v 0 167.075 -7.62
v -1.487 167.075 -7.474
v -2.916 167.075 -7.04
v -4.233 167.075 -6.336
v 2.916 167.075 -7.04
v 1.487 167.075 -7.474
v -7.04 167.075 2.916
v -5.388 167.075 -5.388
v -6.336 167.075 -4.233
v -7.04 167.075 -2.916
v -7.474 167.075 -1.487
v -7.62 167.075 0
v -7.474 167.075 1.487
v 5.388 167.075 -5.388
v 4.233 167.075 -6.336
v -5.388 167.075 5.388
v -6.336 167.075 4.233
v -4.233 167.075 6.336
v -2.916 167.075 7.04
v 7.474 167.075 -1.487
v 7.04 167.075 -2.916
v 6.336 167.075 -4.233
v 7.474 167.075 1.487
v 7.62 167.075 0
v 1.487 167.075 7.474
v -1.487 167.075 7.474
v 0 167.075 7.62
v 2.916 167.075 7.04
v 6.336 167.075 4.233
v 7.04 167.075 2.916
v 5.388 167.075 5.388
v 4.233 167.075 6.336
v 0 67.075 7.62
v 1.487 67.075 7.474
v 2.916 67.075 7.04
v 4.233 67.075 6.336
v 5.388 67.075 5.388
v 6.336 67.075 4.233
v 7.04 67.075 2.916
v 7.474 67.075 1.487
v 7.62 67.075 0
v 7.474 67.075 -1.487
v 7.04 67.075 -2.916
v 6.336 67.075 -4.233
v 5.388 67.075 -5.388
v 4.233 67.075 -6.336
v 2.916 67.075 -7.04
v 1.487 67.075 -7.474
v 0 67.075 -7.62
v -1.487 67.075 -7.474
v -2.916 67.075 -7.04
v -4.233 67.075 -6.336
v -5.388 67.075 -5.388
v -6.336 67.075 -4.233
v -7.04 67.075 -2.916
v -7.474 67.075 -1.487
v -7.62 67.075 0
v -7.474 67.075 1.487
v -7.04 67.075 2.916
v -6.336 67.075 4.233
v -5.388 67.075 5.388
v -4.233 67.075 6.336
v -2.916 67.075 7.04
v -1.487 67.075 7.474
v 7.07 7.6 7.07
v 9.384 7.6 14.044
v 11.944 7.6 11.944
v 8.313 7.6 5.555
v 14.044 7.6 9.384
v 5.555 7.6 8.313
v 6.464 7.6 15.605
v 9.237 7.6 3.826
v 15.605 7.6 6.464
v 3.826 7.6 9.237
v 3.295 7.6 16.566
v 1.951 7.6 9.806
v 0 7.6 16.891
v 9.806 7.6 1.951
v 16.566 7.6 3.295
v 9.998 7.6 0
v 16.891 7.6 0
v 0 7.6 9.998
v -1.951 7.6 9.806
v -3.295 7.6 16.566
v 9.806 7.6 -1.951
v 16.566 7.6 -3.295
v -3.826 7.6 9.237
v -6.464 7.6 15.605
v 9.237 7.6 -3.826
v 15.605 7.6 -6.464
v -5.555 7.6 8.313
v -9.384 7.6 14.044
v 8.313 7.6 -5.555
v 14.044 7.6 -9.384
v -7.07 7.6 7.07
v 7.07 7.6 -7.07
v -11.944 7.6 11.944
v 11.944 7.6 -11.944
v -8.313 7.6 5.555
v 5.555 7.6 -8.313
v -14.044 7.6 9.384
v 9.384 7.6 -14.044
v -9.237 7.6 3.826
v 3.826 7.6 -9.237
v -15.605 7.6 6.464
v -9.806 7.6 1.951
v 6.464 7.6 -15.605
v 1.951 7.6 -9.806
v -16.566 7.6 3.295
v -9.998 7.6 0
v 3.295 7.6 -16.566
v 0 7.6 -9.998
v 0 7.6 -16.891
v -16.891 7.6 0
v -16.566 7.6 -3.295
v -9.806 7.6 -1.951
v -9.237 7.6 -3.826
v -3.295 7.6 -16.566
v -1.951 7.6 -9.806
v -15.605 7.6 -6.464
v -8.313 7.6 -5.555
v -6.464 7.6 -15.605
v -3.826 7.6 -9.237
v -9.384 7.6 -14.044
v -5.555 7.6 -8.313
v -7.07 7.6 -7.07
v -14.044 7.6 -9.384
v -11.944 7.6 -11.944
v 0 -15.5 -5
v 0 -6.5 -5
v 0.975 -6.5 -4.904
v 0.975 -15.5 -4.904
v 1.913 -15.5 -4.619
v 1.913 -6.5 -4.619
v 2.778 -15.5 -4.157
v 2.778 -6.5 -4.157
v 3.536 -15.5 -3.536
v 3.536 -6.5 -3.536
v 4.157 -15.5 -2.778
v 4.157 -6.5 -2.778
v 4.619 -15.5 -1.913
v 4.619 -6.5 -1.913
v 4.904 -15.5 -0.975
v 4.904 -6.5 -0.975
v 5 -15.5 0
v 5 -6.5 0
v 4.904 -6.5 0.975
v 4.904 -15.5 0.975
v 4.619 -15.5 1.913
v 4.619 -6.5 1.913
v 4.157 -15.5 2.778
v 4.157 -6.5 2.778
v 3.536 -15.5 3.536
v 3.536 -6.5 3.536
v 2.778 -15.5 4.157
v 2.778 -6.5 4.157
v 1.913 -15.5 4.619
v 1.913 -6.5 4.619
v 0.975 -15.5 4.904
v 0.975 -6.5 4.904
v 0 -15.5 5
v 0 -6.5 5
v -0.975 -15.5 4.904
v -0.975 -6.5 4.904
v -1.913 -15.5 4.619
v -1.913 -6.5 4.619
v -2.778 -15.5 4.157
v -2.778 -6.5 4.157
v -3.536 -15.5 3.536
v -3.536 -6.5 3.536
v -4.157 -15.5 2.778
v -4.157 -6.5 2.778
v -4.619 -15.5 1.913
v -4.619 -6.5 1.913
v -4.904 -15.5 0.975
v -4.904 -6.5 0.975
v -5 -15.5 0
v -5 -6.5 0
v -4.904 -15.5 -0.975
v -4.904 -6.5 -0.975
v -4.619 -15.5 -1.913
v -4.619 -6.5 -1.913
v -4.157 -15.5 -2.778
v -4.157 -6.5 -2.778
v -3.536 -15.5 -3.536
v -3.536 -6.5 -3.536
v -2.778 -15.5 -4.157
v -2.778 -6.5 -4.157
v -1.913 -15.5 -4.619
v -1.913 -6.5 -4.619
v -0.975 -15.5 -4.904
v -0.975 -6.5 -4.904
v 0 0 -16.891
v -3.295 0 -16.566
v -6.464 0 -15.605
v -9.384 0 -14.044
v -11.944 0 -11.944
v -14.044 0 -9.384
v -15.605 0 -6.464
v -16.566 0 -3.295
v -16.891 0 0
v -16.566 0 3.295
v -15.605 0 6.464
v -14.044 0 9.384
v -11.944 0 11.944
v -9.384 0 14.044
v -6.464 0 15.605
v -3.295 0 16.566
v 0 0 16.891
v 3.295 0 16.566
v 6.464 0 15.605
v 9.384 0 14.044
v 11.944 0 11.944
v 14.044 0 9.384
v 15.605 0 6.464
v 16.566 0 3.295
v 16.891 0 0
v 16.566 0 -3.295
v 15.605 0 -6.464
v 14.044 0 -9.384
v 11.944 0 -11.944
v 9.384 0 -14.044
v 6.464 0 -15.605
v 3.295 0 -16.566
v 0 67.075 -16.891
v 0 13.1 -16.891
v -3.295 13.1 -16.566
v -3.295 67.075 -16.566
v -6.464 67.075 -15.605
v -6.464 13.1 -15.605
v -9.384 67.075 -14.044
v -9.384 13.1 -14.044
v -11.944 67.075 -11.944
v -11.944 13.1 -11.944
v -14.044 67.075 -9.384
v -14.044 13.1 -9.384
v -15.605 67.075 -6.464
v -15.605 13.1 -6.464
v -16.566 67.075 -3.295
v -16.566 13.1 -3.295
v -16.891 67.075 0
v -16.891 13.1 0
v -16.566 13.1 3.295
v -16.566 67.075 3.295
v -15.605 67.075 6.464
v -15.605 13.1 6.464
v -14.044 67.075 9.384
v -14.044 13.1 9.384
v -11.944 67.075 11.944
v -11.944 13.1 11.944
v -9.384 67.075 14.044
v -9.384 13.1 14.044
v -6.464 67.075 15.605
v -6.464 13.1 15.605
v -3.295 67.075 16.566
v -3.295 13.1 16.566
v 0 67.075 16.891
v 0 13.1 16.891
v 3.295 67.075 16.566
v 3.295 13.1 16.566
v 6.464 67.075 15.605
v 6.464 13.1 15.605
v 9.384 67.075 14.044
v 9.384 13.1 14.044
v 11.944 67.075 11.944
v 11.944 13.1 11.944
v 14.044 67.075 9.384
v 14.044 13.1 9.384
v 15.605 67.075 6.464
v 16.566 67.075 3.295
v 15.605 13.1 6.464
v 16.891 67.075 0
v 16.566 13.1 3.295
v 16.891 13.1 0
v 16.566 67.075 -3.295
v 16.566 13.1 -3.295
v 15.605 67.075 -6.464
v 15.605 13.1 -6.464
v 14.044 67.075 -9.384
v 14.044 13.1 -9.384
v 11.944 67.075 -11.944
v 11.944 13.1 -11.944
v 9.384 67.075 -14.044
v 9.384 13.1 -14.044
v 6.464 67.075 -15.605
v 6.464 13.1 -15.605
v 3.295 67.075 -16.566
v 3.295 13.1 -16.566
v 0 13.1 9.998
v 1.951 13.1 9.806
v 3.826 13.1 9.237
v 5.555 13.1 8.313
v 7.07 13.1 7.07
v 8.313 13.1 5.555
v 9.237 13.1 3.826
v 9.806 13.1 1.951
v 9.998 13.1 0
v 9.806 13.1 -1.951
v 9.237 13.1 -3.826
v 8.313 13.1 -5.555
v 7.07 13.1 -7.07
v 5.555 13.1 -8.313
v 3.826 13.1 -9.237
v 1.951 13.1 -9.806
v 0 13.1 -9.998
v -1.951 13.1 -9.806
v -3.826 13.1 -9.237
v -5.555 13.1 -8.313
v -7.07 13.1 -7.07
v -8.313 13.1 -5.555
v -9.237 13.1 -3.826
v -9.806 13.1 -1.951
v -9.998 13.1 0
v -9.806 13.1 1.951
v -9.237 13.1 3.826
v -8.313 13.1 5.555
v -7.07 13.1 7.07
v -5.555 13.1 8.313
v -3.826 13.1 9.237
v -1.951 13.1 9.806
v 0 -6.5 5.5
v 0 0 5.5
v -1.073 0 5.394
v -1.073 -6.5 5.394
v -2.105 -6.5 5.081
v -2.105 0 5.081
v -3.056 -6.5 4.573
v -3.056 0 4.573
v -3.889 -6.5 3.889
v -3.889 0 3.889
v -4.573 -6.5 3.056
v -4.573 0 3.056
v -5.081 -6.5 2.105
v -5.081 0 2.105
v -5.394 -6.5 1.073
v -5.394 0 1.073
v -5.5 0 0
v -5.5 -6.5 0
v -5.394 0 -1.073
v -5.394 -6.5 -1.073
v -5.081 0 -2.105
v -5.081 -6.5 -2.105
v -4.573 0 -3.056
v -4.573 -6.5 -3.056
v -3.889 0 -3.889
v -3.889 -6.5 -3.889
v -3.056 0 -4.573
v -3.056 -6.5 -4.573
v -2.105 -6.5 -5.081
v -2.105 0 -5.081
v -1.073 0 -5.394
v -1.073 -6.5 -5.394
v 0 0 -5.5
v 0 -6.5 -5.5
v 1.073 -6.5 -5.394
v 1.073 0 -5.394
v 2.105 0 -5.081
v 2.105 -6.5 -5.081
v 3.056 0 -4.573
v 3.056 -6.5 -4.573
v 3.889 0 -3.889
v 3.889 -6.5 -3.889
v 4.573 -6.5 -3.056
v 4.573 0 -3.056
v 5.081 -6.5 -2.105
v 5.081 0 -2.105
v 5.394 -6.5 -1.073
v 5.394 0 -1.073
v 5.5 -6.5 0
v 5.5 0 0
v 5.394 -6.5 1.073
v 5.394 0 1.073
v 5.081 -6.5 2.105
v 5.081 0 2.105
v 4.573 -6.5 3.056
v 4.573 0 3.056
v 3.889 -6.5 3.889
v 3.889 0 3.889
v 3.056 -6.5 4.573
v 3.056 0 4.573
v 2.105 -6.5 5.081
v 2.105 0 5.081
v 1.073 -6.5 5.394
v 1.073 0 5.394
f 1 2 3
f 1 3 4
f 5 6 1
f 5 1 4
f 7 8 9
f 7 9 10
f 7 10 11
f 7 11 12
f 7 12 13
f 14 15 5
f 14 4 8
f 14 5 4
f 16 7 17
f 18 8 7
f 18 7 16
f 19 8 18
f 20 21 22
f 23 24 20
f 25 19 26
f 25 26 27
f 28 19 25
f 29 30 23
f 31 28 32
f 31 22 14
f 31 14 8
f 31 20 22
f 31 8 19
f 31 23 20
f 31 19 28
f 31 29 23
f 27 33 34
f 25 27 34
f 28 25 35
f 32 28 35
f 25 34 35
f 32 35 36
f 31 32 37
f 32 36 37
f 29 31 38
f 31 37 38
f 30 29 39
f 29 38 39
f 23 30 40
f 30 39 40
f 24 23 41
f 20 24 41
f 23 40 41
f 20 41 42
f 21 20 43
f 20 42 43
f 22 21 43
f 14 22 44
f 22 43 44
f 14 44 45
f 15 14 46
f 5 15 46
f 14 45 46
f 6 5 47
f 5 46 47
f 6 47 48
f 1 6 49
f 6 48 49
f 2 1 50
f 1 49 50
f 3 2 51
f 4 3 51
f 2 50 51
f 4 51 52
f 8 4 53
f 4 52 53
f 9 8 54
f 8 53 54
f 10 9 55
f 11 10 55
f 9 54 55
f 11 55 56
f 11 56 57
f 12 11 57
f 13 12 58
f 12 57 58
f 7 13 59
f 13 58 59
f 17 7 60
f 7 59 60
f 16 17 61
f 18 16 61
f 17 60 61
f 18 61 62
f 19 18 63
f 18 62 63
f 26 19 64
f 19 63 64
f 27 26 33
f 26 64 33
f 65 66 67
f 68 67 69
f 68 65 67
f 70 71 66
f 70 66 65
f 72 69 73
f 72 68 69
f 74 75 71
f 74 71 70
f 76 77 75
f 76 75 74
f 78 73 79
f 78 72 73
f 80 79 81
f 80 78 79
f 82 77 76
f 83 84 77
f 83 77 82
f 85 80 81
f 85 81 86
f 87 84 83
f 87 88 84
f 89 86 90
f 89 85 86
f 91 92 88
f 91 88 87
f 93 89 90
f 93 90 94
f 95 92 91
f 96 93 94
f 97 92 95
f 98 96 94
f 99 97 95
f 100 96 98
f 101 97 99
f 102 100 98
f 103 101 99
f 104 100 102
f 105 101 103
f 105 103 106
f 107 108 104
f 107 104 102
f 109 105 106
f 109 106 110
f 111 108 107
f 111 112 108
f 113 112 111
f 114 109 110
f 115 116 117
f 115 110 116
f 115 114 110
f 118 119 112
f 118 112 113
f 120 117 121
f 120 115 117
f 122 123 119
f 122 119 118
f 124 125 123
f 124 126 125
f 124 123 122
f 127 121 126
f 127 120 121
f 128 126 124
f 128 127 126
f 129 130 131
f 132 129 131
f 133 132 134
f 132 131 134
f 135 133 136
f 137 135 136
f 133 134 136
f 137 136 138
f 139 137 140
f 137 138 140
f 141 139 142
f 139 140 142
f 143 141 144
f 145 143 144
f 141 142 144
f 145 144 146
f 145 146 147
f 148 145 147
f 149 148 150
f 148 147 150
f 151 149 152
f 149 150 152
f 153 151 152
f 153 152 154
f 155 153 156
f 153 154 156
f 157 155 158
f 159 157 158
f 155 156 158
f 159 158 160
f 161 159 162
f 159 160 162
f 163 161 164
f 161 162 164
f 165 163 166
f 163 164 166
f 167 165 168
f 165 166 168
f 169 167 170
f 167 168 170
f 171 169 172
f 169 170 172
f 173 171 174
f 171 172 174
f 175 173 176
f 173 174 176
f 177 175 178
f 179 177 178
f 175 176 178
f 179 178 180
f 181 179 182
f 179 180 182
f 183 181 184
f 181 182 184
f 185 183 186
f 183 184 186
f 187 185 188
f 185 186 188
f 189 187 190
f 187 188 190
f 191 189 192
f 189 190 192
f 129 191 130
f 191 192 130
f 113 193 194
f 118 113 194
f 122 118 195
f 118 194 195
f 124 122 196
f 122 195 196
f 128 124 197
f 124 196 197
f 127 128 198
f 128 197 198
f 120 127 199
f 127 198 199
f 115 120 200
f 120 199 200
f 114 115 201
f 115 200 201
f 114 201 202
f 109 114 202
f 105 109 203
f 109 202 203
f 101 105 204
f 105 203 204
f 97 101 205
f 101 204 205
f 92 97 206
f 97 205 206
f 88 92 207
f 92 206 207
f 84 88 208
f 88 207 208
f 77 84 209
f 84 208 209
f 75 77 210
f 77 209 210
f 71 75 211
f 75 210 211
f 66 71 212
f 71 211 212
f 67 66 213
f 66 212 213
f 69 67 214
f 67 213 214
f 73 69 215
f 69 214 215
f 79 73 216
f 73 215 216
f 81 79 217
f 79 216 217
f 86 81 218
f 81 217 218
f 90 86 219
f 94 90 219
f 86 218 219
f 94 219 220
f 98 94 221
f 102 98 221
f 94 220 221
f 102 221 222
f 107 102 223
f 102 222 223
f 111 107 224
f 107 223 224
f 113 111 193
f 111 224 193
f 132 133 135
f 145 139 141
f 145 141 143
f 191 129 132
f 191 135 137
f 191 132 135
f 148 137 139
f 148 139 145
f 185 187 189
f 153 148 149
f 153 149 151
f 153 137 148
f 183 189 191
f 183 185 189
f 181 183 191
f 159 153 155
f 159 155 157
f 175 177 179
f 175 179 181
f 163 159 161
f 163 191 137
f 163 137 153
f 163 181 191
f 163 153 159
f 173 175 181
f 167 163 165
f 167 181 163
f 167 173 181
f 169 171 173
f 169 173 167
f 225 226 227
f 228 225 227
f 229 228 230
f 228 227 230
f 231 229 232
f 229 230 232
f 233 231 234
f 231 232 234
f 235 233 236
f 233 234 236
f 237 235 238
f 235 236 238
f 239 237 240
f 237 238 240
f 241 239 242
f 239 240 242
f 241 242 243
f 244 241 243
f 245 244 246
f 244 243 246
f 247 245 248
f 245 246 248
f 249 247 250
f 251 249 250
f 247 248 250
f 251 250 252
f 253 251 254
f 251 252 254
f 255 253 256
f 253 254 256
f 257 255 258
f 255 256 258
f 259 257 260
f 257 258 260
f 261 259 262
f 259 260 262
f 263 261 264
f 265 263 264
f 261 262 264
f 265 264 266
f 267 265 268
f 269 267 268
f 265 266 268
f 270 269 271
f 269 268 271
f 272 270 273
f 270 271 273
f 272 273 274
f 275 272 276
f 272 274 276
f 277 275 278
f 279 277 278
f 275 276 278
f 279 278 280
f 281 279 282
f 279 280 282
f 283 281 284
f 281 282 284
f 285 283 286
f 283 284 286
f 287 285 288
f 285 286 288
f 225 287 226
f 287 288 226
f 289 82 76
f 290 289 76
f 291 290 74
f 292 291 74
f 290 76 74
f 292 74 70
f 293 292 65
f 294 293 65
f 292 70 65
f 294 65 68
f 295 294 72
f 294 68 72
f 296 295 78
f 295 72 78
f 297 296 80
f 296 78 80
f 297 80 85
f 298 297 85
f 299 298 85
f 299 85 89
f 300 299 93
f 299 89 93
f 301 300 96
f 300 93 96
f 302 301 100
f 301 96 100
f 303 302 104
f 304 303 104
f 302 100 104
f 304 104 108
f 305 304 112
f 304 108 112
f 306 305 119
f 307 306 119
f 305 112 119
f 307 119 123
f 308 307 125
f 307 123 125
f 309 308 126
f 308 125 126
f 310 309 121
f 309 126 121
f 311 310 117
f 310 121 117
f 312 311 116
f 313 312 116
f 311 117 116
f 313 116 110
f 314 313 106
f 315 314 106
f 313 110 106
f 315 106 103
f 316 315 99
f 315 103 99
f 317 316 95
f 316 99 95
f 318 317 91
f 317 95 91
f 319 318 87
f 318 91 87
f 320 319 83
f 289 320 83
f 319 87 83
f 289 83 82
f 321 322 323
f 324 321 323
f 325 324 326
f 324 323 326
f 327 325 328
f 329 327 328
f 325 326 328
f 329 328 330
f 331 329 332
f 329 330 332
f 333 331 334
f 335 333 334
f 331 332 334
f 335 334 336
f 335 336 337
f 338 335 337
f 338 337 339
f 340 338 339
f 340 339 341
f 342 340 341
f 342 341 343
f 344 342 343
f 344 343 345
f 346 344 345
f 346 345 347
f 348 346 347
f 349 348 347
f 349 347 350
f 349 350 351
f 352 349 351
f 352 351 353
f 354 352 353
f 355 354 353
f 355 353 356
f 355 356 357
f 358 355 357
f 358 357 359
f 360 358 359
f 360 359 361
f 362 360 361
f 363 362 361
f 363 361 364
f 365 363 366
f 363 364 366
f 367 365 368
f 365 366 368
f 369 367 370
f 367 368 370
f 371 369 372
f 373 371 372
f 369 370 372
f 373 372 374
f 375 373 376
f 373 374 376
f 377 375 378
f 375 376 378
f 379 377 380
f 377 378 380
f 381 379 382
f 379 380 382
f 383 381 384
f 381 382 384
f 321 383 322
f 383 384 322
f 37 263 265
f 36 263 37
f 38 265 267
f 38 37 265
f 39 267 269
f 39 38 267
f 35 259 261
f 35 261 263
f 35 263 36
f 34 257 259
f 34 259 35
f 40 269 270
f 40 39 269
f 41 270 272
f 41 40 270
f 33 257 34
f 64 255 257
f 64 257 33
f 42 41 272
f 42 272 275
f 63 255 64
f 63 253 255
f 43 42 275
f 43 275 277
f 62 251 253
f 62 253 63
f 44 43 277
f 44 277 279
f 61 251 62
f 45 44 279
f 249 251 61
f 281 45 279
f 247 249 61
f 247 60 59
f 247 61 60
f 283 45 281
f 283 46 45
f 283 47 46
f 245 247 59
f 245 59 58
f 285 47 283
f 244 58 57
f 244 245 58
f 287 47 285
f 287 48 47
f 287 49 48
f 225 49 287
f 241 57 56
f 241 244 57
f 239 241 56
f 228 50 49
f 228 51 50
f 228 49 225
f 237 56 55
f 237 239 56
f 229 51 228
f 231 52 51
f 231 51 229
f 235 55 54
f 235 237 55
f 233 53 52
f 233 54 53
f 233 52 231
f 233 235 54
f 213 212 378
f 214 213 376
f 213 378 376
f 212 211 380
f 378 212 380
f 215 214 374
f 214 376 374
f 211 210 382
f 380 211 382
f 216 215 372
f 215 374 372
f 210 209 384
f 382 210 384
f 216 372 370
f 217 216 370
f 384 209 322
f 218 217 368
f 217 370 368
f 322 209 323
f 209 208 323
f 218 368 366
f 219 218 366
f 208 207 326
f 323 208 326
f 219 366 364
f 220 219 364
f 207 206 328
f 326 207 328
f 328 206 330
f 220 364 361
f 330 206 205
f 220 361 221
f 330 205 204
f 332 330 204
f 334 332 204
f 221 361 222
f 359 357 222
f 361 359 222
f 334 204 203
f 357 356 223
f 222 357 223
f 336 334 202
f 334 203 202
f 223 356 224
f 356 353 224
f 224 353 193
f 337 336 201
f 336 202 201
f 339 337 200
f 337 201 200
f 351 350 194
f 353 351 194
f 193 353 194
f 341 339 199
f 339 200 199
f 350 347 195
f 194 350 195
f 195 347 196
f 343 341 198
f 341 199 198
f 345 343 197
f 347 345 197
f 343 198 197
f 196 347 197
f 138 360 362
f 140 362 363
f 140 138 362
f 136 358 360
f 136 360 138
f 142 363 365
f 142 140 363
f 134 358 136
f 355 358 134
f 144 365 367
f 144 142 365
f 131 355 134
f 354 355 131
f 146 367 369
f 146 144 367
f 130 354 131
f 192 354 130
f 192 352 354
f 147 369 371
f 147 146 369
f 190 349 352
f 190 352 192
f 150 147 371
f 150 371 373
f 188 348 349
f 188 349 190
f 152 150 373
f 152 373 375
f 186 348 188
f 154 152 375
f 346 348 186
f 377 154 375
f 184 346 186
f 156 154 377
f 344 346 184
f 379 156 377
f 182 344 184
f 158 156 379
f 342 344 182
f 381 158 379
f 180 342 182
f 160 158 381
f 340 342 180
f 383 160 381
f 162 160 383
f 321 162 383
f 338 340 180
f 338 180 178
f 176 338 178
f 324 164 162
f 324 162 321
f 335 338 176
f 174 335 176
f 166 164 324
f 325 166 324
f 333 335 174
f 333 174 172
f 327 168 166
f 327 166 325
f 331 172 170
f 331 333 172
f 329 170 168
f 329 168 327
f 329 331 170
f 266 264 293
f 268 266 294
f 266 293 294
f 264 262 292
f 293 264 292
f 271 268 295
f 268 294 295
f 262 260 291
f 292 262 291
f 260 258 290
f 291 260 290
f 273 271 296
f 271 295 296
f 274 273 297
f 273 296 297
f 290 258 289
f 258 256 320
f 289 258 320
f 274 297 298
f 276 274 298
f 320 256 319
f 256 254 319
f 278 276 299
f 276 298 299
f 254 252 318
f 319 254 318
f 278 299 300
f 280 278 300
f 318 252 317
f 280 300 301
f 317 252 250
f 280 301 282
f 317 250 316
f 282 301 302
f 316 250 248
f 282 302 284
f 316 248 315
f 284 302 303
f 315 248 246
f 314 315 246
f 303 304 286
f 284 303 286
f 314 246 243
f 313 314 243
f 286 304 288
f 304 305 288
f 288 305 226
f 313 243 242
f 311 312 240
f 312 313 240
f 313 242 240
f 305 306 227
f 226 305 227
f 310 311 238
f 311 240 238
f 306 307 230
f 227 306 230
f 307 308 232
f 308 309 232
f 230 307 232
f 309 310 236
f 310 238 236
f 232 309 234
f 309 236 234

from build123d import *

# Parameters (mm, degrees)
SKETCH1_R           = 16.891
EXTRUDE1_DEPTH      = 7.6
SKETCH2_R           = 9.998276061
EXTRUDE2_DEPTH      = 5.5
SKETCH3_R           = 16.891
EXTRUDE3_DEPTH      = 53.975
SKETCH4_R           = 5.5
BOSS_EXTRUDE1_DEPTH = 15.5
CUT_EXTRUDE1_START  = -9
SKETCH5_R           = 5.5
SKETCH5_R_2         = 5
CUT_EXTRUDE1_DEPTH  = 9
SKETCH6_R           = 7.62
BOSS_EXTRUDE2_DEPTH = 100


with BuildPart() as part:
    # Sketch1 → Extrude1 (new body)
    with BuildSketch(Plane(origin=(0, 0, 0), x_dir=(1, 0, 0), z_dir=(0, 1, 0))):
        with Locations(Location((0, 0, 0), (0, 0, 90))):
            Circle(SKETCH1_R)
    extrude(amount=EXTRUDE1_DEPTH)

    # Sketch2 → Extrude2 (add)
    with BuildSketch(Plane(origin=(0, 7.6, 0), x_dir=(1, 0, 0), z_dir=(0, 1, 0))):
        with Locations(Location((0, 0, 0), (0, 0, 270))):
            Circle(SKETCH2_R)
    extrude(amount=EXTRUDE2_DEPTH)

    # Sketch3 → Extrude3 (add)
    with BuildSketch(Plane(origin=(0, 13.1, 0), x_dir=(1, 0, 0), z_dir=(0, 1, 0))):
        with Locations(Location((0, 0, 0), (0, 0, 90))):
            Circle(SKETCH3_R)
    extrude(amount=EXTRUDE3_DEPTH)

    # Sketch4 → Boss-Extrude1 (add)
    with BuildSketch(Plane.XZ):
        with Locations(Location((0, 0, 0), (0, 0, 90))):
            Circle(SKETCH4_R)
    extrude(amount=BOSS_EXTRUDE1_DEPTH)

    # Sketch5 → Cut-Extrude1 (cut)
    with BuildSketch(Plane.XZ.offset(15.5).offset(CUT_EXTRUDE1_START)):
        with Locations(Location((0, 0, 0), (0, 0, 90))):
            Circle(SKETCH5_R)
        with Locations(Location((0, 0, 0), (0, 0, 270))):
            Circle(SKETCH5_R_2, mode=Mode.SUBTRACT)
    extrude(amount=CUT_EXTRUDE1_DEPTH, mode=Mode.SUBTRACT)

    # Sketch6 → Boss-Extrude2 (add)
    with BuildSketch(Plane(origin=(0, 67.075, 0), x_dir=(-1, 0, 0), z_dir=(0, 1, 0))):
        with Locations(Location((0, 0, 0), (0, 0, 90))):
            Circle(SKETCH6_R)
    extrude(amount=BOSS_EXTRUDE2_DEPTH)


solid = part.part
